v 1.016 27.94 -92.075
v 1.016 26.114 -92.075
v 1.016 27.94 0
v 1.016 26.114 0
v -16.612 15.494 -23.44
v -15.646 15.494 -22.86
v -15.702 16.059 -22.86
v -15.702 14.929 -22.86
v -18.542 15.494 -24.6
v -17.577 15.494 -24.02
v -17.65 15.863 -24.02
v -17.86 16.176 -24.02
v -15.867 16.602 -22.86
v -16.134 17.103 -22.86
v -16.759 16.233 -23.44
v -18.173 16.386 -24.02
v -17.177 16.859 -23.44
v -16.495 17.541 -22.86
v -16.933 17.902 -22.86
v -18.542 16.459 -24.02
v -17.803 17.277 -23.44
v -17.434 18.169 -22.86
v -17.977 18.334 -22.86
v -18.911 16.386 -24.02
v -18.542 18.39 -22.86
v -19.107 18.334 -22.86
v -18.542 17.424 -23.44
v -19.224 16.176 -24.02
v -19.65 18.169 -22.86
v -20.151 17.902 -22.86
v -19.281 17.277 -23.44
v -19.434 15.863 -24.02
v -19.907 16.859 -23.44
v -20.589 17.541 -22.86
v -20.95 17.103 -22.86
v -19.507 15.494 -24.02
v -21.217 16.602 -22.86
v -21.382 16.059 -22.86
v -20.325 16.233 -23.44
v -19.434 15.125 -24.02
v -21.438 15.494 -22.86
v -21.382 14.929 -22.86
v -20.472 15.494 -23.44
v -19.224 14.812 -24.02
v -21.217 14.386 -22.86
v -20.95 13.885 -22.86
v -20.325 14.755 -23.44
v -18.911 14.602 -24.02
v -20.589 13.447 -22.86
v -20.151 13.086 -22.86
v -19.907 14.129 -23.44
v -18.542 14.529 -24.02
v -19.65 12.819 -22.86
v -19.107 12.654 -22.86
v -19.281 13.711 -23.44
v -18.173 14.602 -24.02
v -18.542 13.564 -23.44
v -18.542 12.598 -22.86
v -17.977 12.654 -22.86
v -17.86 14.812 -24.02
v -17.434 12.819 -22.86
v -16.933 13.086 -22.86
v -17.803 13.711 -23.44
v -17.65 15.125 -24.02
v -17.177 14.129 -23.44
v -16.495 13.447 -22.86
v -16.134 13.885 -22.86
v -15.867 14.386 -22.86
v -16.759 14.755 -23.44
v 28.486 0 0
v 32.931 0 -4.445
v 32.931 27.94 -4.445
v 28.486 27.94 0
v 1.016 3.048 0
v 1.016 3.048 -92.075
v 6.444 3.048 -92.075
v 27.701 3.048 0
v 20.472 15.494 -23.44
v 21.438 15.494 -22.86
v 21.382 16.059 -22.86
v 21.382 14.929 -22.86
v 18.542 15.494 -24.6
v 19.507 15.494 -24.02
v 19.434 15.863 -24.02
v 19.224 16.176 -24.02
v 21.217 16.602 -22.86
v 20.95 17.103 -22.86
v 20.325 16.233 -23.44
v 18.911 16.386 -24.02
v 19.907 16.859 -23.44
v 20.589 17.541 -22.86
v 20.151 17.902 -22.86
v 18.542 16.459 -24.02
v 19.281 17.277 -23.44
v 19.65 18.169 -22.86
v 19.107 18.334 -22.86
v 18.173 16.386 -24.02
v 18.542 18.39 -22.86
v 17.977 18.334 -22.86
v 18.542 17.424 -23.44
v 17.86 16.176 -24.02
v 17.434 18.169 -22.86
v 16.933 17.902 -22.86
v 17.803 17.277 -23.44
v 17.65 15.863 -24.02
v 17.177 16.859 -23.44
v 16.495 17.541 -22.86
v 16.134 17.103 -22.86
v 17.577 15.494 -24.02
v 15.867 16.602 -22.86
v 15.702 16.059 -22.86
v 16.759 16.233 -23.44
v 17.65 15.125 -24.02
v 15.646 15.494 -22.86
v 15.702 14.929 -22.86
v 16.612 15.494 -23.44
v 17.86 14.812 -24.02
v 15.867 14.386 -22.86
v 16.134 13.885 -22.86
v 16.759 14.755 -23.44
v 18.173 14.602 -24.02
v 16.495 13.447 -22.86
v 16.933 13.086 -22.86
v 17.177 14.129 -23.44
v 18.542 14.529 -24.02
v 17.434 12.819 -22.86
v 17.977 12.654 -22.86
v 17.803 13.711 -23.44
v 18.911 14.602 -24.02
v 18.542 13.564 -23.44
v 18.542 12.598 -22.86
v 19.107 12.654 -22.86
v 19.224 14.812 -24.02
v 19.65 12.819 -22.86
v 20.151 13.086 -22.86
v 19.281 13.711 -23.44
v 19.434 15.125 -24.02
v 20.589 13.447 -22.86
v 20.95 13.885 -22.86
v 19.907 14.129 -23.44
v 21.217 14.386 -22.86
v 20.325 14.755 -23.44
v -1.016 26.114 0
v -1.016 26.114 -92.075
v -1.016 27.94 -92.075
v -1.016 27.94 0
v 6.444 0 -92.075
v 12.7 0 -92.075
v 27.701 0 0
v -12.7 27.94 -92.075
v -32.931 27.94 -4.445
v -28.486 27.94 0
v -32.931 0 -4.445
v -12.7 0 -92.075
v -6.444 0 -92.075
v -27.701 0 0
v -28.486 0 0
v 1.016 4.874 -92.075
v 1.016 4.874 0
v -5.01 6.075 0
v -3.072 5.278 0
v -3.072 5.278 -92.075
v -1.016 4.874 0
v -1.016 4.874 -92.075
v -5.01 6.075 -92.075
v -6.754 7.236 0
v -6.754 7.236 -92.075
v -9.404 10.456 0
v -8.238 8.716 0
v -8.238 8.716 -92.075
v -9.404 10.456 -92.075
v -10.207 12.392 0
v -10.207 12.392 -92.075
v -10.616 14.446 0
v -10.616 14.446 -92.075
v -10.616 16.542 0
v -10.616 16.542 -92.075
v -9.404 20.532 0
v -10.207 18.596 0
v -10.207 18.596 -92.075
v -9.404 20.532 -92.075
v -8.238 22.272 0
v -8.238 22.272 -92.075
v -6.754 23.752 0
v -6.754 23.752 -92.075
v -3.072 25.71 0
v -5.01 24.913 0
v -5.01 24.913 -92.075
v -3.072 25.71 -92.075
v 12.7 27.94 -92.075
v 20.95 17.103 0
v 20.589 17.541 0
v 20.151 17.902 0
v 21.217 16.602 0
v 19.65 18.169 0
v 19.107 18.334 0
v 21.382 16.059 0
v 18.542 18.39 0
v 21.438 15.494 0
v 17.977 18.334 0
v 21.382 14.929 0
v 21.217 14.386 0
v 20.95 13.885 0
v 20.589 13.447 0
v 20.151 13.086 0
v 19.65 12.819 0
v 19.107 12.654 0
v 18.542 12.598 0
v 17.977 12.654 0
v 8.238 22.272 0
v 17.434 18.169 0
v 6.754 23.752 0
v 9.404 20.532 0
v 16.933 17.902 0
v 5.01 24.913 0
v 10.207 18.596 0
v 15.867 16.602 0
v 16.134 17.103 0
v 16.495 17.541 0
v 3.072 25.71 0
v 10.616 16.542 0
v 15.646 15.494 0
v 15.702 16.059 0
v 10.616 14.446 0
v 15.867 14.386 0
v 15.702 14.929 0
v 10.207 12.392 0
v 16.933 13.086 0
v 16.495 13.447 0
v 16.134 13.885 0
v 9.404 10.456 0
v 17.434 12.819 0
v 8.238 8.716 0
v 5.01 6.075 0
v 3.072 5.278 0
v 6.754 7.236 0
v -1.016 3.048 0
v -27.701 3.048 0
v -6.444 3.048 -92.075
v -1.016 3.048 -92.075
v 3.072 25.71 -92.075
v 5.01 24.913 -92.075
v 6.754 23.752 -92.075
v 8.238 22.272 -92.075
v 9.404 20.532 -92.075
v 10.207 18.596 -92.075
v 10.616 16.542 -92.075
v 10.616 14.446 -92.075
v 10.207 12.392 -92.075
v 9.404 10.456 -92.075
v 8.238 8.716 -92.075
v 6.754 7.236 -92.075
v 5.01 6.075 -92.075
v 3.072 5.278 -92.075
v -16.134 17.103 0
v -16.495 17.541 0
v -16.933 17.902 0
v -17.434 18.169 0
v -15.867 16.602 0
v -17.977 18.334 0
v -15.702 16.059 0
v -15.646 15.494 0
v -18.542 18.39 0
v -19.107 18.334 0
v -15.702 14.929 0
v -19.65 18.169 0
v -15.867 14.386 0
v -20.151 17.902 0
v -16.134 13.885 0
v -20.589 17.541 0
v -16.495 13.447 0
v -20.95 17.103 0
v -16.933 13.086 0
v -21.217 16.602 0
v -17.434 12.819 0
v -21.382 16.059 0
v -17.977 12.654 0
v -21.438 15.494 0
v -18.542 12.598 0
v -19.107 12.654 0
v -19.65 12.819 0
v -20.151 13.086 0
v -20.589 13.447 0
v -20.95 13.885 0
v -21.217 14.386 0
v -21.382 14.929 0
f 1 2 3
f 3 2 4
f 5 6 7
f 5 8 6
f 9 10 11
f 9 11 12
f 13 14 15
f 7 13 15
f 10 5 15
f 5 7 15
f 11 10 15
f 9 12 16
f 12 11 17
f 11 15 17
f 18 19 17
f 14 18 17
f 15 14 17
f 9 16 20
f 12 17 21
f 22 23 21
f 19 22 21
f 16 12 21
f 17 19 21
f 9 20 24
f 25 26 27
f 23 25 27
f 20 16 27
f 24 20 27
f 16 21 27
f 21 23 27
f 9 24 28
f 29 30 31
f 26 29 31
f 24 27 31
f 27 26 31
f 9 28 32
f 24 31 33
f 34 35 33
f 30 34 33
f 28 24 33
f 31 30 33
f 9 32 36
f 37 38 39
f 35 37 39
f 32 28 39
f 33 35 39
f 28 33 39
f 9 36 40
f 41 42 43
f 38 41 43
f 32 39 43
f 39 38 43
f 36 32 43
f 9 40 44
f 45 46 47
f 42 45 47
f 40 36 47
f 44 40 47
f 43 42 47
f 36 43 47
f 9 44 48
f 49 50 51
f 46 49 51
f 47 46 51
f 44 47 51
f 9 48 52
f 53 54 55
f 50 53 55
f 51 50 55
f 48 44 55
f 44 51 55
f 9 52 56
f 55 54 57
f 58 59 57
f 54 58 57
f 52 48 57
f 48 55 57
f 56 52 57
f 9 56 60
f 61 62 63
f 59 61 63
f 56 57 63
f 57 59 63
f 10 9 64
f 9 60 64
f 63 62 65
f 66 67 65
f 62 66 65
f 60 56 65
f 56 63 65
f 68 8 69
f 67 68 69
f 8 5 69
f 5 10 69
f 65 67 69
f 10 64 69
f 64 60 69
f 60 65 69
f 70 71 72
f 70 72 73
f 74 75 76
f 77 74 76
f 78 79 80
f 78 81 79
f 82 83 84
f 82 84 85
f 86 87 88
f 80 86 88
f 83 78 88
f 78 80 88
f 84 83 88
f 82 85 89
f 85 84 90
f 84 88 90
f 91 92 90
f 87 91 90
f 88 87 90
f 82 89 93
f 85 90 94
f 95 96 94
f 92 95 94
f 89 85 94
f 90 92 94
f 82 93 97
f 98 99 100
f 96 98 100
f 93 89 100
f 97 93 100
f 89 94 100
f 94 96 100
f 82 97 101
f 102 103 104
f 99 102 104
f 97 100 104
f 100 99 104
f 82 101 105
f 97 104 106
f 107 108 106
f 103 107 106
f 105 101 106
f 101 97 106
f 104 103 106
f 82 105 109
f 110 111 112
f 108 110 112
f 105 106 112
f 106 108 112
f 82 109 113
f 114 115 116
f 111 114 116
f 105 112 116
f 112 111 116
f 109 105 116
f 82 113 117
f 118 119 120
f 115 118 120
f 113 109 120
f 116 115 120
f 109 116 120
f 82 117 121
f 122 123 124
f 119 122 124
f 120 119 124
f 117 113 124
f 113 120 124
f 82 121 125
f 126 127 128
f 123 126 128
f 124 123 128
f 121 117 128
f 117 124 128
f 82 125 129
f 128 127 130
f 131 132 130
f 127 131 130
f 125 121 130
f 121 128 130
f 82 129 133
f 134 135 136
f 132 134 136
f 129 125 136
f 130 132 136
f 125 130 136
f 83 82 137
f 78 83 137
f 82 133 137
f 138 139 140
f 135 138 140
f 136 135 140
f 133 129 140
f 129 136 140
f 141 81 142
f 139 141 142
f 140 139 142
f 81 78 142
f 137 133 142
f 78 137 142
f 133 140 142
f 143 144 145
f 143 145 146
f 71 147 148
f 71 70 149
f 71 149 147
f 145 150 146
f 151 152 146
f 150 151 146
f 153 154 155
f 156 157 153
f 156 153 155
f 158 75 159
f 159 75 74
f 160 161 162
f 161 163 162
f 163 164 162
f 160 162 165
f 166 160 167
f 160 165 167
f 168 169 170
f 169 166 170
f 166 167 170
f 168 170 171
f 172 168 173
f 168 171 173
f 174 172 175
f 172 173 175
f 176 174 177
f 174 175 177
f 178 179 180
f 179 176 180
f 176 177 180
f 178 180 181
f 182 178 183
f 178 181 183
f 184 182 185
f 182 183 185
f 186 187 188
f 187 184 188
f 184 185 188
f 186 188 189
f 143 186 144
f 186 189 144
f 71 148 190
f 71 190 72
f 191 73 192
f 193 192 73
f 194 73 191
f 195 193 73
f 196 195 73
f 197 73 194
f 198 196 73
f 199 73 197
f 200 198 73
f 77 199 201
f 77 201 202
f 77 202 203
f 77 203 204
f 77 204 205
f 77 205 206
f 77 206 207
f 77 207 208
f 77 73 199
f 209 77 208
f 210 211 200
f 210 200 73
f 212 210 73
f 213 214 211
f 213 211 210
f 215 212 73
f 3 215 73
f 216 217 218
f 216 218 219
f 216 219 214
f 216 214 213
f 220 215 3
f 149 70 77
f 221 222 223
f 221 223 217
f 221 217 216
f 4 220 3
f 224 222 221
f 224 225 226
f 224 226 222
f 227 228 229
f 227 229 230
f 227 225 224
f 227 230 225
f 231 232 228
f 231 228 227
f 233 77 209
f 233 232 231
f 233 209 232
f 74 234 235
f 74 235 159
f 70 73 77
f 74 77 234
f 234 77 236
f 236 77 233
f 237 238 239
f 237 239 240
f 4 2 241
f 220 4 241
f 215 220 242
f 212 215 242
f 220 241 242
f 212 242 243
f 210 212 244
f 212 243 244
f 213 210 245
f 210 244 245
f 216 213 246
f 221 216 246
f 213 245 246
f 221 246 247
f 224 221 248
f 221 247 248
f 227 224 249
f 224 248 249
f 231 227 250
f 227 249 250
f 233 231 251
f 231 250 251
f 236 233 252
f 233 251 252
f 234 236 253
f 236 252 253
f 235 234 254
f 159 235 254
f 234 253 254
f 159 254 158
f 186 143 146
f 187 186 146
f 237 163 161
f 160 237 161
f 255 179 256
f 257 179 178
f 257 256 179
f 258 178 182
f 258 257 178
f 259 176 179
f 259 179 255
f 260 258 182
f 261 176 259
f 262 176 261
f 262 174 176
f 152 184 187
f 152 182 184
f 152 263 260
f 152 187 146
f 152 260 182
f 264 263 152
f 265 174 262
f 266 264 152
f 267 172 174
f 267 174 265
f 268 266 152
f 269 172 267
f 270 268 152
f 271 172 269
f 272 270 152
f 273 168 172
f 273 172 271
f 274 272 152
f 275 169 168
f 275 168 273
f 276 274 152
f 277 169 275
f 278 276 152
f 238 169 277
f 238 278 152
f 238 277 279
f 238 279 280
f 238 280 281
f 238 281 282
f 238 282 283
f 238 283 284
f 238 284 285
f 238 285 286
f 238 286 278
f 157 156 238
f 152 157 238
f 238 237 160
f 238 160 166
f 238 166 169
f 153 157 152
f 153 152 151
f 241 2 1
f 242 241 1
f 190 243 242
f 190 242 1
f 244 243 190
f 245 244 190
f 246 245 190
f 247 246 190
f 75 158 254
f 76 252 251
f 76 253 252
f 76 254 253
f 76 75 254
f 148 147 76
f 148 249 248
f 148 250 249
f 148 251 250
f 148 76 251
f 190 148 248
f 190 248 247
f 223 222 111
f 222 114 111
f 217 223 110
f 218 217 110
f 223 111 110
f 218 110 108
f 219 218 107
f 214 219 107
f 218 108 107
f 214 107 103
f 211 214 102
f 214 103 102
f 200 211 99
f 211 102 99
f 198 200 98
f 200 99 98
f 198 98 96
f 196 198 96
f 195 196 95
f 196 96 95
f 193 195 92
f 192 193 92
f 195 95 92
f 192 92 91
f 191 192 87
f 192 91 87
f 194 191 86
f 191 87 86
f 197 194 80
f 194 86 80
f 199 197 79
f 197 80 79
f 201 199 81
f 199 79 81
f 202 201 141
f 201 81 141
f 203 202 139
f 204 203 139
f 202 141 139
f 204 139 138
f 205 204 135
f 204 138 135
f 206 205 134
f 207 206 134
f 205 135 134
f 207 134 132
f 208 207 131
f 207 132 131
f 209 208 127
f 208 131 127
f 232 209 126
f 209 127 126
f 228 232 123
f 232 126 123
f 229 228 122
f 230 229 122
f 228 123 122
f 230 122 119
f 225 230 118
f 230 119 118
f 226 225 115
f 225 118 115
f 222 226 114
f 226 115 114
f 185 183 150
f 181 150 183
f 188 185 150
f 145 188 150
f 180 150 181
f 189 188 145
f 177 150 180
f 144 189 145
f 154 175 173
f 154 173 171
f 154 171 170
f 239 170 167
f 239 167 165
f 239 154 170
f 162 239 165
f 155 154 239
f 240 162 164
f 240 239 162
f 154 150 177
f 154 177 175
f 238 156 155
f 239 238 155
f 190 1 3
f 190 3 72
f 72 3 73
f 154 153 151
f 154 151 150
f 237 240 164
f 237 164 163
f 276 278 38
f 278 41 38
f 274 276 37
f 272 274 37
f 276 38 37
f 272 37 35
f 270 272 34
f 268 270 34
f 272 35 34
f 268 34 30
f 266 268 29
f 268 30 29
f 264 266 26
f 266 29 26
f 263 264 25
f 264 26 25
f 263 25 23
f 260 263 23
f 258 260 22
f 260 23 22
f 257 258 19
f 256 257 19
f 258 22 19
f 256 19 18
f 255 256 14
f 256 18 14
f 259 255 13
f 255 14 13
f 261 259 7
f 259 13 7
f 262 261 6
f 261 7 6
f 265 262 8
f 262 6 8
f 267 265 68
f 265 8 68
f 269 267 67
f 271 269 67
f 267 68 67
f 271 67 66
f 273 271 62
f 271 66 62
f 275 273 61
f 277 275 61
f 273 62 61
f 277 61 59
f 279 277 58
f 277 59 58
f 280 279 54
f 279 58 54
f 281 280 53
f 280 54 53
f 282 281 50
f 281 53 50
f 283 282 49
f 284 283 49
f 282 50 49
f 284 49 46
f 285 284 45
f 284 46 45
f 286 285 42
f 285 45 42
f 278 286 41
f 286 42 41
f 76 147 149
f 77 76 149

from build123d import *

# Parameters (mm, degrees)
F1_DEPTH = 27.94
F3_DEPTH = 3.048
F5_D     = 5.7912
F5_DEPTH = 22.86
F5_TIP   = 1.7398520085
F7_D     = 21.336
F8_W     = 2.032
F8_H     = 92.075
F9_DEPTH = 24.893


# Not quite as in the source:
# - a feature names something its author has since deleted; it is built from what else it names


with BuildPart() as f1:
    # F0 (on Front) → F1 (new body)
    with BuildSketch(Plane.XZ):
        Polygon((12.7, -92.075), (32.9309795883, -4.445), (28.4859795883, 0), (-28.4859795883, 0), (-32.9309795883, -4.445), (-12.7, -92.075), align=None)
    extrude(amount=-F1_DEPTH)

    # F2 (on face) → F3 (cut)
    with BuildSketch(Plane.XZ):
        Polygon((-27.7008388568, 0), (-6.4436501589, -92.075), (6.4436501589, -92.075), (27.7008388568, 0), align=None)
    extrude(amount=-F3_DEPTH, mode=Mode.SUBTRACT)

    # F5
    with Locations(Plane.XY):
        with Locations((-18.542, 15.494), (18.542, 15.494)):
            Hole(F5_D / 2, depth=F5_DEPTH)
            with Locations((0, 0, -(F5_DEPTH + F5_TIP / 2))):  # 118° drill point
                Cone(0, F5_D / 2, F5_TIP, mode=Mode.SUBTRACT)

    # F7 (through all)
    with Locations(Plane.XY):
        with Locations((0, 15.494)):
            Hole(F7_D / 2)

    # F8 (on face) → F9 (cut, through all)
    with BuildSketch(Plane.XZ.offset(-3.048)):
        with Locations((0, -46.0375)):
            Rectangle(F8_W, F8_H)
    extrude(amount=-F9_DEPTH, mode=Mode.SUBTRACT)


solid = f1.part
